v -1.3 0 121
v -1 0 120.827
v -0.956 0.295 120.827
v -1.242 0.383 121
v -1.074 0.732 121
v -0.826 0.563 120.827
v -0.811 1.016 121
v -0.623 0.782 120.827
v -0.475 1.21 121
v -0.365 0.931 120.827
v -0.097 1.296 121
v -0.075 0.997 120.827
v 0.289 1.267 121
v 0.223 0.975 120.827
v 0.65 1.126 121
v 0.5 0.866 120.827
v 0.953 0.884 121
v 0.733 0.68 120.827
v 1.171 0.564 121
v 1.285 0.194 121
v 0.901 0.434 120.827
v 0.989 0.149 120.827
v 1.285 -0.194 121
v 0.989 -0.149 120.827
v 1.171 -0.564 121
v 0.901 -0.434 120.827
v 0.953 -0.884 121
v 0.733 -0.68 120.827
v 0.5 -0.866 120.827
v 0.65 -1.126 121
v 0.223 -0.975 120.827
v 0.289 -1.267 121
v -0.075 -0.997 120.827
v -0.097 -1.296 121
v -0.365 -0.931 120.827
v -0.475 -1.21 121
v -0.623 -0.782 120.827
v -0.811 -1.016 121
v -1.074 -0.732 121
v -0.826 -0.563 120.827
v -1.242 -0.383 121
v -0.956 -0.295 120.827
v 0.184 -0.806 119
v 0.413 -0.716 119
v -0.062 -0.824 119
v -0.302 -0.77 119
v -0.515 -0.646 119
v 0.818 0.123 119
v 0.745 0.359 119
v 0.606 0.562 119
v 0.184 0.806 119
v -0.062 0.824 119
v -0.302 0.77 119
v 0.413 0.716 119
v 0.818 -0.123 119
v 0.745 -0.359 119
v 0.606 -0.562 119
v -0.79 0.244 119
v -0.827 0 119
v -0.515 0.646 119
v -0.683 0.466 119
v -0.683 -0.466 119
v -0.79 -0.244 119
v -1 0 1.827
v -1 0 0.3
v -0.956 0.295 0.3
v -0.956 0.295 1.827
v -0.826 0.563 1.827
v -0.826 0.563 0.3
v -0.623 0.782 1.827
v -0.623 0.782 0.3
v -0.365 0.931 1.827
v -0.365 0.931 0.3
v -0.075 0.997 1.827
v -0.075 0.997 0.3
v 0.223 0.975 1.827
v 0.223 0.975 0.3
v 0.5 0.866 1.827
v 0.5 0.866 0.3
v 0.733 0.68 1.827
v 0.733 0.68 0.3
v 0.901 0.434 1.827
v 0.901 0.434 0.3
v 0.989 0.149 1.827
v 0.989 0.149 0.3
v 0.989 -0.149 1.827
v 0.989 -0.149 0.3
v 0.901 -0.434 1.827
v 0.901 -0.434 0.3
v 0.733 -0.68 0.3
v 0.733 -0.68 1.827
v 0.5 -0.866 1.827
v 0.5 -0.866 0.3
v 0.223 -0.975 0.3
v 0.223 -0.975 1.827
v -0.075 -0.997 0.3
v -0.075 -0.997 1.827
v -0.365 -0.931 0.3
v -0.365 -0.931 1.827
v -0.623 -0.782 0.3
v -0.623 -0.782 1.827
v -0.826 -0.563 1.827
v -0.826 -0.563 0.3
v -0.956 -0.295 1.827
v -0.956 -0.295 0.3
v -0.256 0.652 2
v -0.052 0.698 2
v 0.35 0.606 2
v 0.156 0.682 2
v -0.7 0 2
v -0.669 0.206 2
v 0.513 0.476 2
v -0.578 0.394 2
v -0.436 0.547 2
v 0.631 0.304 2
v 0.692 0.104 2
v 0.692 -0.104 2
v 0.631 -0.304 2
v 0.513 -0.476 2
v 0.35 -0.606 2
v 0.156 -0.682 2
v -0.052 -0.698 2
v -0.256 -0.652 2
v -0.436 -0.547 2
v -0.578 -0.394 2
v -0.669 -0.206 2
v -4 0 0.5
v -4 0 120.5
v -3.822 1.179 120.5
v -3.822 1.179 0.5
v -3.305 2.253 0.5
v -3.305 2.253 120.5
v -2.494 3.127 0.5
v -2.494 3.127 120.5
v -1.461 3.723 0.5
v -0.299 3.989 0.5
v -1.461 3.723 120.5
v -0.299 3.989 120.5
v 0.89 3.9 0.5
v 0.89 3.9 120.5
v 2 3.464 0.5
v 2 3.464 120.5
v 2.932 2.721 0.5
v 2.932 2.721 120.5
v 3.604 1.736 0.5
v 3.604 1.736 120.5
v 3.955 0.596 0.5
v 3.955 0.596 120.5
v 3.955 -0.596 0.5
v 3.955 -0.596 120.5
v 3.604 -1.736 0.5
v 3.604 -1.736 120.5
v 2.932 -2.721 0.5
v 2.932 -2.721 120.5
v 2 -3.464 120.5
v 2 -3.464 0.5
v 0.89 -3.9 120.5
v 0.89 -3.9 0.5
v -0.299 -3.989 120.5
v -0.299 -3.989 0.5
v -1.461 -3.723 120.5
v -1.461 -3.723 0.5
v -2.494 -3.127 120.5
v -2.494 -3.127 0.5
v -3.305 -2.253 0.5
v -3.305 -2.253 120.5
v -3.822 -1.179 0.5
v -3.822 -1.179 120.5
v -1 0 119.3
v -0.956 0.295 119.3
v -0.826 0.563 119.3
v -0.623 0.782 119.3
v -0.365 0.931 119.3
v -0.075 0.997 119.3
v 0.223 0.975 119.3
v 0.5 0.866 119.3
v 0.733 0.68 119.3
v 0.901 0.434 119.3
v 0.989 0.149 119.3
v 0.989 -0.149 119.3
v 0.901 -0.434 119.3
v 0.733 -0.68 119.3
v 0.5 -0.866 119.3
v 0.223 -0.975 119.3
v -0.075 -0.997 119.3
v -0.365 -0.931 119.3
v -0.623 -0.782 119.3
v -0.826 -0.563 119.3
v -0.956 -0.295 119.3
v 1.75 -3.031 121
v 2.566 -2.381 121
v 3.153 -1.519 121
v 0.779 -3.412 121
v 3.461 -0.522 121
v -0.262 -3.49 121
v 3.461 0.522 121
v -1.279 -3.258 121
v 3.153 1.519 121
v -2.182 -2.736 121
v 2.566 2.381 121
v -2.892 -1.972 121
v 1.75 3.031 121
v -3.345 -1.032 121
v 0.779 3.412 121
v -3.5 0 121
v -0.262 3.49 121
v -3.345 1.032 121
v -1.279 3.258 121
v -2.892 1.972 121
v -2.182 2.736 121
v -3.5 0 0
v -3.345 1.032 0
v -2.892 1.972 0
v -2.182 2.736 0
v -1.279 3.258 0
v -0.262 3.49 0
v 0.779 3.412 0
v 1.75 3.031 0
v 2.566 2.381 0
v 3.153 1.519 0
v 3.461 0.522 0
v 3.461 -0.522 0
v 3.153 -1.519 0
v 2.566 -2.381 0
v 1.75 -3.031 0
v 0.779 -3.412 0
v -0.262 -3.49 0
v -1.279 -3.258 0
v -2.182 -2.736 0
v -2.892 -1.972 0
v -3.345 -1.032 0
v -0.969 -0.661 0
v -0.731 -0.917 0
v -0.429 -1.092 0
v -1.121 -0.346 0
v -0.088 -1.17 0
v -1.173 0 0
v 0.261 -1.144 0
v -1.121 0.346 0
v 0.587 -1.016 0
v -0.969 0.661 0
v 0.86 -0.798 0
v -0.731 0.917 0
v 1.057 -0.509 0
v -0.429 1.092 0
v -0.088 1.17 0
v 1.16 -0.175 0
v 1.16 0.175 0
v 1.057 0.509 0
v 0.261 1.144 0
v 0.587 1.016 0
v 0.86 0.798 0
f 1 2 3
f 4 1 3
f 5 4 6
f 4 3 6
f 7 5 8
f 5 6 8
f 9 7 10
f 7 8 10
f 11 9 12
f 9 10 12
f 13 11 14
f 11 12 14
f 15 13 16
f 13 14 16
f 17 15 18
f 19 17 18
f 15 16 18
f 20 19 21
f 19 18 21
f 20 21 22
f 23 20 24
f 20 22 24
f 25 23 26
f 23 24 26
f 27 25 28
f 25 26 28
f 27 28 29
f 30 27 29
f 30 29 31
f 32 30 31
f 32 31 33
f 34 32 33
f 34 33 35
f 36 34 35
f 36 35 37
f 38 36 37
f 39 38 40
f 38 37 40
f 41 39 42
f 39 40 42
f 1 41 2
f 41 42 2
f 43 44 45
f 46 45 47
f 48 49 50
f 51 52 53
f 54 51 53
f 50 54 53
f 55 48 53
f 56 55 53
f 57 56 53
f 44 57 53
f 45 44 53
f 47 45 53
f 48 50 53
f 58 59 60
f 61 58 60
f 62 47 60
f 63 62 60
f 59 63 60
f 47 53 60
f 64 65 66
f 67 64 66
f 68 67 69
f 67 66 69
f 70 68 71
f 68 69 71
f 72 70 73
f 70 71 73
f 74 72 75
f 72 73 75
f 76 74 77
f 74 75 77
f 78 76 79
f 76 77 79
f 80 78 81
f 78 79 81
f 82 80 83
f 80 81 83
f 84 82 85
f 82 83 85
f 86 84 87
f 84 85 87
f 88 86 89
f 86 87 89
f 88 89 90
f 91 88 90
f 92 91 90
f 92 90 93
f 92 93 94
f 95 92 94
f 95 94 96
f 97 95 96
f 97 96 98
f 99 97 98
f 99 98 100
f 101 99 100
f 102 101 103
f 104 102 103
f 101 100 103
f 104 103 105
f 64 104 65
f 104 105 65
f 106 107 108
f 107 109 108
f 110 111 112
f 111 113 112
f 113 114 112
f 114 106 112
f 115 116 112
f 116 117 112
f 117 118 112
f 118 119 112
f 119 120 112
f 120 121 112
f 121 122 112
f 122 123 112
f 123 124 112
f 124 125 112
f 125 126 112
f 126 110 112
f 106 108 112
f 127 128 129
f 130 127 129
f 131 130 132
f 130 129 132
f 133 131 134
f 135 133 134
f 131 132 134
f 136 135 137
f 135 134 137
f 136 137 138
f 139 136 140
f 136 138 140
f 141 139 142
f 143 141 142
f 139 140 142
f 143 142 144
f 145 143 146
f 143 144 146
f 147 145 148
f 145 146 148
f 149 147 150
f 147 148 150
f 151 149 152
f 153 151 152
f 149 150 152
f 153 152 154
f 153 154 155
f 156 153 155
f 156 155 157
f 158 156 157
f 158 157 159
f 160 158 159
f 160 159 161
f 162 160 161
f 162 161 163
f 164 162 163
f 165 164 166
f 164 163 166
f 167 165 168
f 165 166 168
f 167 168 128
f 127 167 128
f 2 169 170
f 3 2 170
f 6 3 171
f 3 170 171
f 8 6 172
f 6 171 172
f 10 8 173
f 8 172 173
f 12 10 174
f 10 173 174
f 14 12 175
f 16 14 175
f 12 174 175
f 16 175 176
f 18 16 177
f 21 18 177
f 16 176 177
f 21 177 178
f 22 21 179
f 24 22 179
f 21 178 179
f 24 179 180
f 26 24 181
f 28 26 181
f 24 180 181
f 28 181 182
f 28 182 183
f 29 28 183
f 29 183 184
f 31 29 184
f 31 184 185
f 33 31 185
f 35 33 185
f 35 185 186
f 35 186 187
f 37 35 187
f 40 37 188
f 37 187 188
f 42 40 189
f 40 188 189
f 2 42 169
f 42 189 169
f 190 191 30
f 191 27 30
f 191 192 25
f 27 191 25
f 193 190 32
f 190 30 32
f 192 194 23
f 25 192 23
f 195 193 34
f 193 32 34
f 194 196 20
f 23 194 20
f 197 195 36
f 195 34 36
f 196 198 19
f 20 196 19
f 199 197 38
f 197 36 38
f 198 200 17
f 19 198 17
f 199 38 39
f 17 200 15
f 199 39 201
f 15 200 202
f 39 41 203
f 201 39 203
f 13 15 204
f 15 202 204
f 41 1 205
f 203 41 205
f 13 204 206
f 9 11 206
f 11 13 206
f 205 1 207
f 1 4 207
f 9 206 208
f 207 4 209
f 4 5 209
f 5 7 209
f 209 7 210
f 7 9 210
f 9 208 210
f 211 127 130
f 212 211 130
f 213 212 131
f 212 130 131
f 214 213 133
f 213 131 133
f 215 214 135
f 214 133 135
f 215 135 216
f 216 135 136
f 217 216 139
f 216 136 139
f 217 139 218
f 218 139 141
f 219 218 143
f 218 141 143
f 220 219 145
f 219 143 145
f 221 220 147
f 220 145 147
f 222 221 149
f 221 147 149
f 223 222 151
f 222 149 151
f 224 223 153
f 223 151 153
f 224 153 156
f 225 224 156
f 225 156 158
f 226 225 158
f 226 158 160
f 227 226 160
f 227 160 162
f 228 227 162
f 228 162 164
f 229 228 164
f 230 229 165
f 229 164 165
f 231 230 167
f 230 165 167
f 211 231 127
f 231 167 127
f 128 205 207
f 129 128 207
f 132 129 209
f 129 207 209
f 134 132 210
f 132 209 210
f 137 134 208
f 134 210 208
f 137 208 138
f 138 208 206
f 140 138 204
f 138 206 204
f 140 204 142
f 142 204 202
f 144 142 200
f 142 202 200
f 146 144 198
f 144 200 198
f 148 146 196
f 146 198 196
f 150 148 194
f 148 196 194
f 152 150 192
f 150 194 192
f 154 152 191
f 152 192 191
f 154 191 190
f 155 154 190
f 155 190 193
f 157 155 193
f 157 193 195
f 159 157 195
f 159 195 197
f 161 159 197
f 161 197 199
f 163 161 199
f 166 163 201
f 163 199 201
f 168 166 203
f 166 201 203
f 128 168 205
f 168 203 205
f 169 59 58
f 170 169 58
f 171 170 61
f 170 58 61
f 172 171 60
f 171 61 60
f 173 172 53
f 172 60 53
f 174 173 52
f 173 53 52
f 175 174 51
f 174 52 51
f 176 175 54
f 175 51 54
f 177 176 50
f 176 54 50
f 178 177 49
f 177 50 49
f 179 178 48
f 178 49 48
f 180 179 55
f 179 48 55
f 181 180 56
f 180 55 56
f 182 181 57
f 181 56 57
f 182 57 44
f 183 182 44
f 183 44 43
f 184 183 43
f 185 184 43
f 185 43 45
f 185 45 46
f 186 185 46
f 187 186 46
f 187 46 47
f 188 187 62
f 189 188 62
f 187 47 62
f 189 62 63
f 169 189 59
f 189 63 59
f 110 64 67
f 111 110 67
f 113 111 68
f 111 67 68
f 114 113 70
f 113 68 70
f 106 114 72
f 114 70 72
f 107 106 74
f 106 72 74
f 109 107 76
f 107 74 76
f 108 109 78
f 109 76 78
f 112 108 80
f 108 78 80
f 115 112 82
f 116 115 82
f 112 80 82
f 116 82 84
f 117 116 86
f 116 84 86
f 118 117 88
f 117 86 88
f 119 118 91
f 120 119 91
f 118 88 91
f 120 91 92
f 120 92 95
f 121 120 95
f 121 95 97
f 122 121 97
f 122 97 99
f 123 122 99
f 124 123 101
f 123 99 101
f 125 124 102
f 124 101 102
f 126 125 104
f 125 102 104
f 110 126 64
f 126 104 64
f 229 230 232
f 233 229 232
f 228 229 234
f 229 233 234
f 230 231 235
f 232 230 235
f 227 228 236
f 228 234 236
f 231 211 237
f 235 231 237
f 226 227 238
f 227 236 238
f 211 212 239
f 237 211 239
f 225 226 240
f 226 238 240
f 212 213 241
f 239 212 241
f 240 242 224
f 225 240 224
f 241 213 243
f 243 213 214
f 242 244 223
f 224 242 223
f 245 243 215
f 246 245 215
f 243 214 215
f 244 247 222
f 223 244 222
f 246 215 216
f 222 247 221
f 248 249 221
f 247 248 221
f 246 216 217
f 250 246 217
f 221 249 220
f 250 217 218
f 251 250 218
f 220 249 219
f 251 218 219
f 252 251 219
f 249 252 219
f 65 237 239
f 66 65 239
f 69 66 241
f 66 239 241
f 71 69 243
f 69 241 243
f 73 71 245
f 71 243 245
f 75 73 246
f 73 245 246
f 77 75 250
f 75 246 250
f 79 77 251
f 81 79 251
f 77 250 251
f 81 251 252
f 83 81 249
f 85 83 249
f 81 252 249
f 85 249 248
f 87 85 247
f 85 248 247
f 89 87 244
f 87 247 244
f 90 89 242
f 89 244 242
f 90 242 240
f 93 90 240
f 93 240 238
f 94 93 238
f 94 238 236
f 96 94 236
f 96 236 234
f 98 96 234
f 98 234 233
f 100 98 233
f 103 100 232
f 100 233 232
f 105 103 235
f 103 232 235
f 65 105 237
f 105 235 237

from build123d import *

# Parameters (mm, degrees)
CHAMFER1_SIZE         = 0.5
CHAMFER2_SIZE         = 0.3
CHAMFER2_SIZE2        = 0.173205081
CHAMFER2_PART_2_SIZE  = 0.3
CHAMFER2_PART_2_SIZE2 = 0.173205081
CHAMFER2_PART_3_SIZE  = 0.3
CHAMFER2_PART_3_SIZE2 = 0.173205081
CHAMFER2_PART_4_SIZE  = 0.3
CHAMFER2_PART_4_SIZE2 = 0.173205081


with BuildPart() as part:
    # Sketch1 → Revolve1 (revolve)
    with BuildSketch(Plane(origin=(0, 0, 0), x_dir=(1, 0, 0), z_dir=(0, 1, 0))):
        Polygon((-1, 0), (-4, 0), (-4, -121), (-1, -121), (-1, -119), (0, -119), (0, -2), (-1, -2), align=None)
    revolve(axis=Axis((0, 0, 119), (0, 0, -1)))

    # Chamfer1
    chamfer1_edges = [part.edges().sort_by_distance(p)[0] for p in [
        (4, 0, 121),
        (4, 0, 0),
    ]]
    chamfer(chamfer1_edges, length=CHAMFER1_SIZE)

    # Chamfer2
    chamfer2_edges = [part.edges().sort_by_distance(p)[0] for p in [
        (1, 0, 2),
    ]]
    chamfer2_side = [part.faces().sort_by_distance(p)[0] for p in [
        (0, 0, 2),
    ]]
    chamfer(chamfer2_edges, length=CHAMFER2_SIZE, length2=CHAMFER2_SIZE2, reference=chamfer2_side[0])

    # Chamfer2 part 2
    chamfer2_part_2_edges = [part.edges().sort_by_distance(p)[0] for p in [
        (1, 0, 119),
    ]]
    chamfer2_part_2_side = [part.faces().sort_by_distance(p)[0] for p in [
        (1, 0, 120),
    ]]
    chamfer(chamfer2_part_2_edges, length=CHAMFER2_PART_2_SIZE, length2=CHAMFER2_PART_2_SIZE2, reference=chamfer2_part_2_side[0])

    # Chamfer2 part 3
    chamfer2_part_3_edges = [part.edges().sort_by_distance(p)[0] for p in [
        (1, 0, 121),
    ]]
    chamfer2_part_3_side = [part.faces().sort_by_distance(p)[0] for p in [
        (3.401005051, 0, 121),
    ]]
    chamfer(chamfer2_part_3_edges, length=CHAMFER2_PART_3_SIZE, length2=CHAMFER2_PART_3_SIZE2, reference=chamfer2_part_3_side[0])

    # Chamfer2 part 4
    chamfer2_part_4_edges = [part.edges().sort_by_distance(p)[0] for p in [
        (1, 0, 0),
    ]]
    chamfer2_part_4_side = [part.faces().sort_by_distance(p)[0] for p in [
        (1, 0, 1),
    ]]
    chamfer(chamfer2_part_4_edges, length=CHAMFER2_PART_4_SIZE, length2=CHAMFER2_PART_4_SIZE2, reference=chamfer2_part_4_side[0])


solid = part.part
